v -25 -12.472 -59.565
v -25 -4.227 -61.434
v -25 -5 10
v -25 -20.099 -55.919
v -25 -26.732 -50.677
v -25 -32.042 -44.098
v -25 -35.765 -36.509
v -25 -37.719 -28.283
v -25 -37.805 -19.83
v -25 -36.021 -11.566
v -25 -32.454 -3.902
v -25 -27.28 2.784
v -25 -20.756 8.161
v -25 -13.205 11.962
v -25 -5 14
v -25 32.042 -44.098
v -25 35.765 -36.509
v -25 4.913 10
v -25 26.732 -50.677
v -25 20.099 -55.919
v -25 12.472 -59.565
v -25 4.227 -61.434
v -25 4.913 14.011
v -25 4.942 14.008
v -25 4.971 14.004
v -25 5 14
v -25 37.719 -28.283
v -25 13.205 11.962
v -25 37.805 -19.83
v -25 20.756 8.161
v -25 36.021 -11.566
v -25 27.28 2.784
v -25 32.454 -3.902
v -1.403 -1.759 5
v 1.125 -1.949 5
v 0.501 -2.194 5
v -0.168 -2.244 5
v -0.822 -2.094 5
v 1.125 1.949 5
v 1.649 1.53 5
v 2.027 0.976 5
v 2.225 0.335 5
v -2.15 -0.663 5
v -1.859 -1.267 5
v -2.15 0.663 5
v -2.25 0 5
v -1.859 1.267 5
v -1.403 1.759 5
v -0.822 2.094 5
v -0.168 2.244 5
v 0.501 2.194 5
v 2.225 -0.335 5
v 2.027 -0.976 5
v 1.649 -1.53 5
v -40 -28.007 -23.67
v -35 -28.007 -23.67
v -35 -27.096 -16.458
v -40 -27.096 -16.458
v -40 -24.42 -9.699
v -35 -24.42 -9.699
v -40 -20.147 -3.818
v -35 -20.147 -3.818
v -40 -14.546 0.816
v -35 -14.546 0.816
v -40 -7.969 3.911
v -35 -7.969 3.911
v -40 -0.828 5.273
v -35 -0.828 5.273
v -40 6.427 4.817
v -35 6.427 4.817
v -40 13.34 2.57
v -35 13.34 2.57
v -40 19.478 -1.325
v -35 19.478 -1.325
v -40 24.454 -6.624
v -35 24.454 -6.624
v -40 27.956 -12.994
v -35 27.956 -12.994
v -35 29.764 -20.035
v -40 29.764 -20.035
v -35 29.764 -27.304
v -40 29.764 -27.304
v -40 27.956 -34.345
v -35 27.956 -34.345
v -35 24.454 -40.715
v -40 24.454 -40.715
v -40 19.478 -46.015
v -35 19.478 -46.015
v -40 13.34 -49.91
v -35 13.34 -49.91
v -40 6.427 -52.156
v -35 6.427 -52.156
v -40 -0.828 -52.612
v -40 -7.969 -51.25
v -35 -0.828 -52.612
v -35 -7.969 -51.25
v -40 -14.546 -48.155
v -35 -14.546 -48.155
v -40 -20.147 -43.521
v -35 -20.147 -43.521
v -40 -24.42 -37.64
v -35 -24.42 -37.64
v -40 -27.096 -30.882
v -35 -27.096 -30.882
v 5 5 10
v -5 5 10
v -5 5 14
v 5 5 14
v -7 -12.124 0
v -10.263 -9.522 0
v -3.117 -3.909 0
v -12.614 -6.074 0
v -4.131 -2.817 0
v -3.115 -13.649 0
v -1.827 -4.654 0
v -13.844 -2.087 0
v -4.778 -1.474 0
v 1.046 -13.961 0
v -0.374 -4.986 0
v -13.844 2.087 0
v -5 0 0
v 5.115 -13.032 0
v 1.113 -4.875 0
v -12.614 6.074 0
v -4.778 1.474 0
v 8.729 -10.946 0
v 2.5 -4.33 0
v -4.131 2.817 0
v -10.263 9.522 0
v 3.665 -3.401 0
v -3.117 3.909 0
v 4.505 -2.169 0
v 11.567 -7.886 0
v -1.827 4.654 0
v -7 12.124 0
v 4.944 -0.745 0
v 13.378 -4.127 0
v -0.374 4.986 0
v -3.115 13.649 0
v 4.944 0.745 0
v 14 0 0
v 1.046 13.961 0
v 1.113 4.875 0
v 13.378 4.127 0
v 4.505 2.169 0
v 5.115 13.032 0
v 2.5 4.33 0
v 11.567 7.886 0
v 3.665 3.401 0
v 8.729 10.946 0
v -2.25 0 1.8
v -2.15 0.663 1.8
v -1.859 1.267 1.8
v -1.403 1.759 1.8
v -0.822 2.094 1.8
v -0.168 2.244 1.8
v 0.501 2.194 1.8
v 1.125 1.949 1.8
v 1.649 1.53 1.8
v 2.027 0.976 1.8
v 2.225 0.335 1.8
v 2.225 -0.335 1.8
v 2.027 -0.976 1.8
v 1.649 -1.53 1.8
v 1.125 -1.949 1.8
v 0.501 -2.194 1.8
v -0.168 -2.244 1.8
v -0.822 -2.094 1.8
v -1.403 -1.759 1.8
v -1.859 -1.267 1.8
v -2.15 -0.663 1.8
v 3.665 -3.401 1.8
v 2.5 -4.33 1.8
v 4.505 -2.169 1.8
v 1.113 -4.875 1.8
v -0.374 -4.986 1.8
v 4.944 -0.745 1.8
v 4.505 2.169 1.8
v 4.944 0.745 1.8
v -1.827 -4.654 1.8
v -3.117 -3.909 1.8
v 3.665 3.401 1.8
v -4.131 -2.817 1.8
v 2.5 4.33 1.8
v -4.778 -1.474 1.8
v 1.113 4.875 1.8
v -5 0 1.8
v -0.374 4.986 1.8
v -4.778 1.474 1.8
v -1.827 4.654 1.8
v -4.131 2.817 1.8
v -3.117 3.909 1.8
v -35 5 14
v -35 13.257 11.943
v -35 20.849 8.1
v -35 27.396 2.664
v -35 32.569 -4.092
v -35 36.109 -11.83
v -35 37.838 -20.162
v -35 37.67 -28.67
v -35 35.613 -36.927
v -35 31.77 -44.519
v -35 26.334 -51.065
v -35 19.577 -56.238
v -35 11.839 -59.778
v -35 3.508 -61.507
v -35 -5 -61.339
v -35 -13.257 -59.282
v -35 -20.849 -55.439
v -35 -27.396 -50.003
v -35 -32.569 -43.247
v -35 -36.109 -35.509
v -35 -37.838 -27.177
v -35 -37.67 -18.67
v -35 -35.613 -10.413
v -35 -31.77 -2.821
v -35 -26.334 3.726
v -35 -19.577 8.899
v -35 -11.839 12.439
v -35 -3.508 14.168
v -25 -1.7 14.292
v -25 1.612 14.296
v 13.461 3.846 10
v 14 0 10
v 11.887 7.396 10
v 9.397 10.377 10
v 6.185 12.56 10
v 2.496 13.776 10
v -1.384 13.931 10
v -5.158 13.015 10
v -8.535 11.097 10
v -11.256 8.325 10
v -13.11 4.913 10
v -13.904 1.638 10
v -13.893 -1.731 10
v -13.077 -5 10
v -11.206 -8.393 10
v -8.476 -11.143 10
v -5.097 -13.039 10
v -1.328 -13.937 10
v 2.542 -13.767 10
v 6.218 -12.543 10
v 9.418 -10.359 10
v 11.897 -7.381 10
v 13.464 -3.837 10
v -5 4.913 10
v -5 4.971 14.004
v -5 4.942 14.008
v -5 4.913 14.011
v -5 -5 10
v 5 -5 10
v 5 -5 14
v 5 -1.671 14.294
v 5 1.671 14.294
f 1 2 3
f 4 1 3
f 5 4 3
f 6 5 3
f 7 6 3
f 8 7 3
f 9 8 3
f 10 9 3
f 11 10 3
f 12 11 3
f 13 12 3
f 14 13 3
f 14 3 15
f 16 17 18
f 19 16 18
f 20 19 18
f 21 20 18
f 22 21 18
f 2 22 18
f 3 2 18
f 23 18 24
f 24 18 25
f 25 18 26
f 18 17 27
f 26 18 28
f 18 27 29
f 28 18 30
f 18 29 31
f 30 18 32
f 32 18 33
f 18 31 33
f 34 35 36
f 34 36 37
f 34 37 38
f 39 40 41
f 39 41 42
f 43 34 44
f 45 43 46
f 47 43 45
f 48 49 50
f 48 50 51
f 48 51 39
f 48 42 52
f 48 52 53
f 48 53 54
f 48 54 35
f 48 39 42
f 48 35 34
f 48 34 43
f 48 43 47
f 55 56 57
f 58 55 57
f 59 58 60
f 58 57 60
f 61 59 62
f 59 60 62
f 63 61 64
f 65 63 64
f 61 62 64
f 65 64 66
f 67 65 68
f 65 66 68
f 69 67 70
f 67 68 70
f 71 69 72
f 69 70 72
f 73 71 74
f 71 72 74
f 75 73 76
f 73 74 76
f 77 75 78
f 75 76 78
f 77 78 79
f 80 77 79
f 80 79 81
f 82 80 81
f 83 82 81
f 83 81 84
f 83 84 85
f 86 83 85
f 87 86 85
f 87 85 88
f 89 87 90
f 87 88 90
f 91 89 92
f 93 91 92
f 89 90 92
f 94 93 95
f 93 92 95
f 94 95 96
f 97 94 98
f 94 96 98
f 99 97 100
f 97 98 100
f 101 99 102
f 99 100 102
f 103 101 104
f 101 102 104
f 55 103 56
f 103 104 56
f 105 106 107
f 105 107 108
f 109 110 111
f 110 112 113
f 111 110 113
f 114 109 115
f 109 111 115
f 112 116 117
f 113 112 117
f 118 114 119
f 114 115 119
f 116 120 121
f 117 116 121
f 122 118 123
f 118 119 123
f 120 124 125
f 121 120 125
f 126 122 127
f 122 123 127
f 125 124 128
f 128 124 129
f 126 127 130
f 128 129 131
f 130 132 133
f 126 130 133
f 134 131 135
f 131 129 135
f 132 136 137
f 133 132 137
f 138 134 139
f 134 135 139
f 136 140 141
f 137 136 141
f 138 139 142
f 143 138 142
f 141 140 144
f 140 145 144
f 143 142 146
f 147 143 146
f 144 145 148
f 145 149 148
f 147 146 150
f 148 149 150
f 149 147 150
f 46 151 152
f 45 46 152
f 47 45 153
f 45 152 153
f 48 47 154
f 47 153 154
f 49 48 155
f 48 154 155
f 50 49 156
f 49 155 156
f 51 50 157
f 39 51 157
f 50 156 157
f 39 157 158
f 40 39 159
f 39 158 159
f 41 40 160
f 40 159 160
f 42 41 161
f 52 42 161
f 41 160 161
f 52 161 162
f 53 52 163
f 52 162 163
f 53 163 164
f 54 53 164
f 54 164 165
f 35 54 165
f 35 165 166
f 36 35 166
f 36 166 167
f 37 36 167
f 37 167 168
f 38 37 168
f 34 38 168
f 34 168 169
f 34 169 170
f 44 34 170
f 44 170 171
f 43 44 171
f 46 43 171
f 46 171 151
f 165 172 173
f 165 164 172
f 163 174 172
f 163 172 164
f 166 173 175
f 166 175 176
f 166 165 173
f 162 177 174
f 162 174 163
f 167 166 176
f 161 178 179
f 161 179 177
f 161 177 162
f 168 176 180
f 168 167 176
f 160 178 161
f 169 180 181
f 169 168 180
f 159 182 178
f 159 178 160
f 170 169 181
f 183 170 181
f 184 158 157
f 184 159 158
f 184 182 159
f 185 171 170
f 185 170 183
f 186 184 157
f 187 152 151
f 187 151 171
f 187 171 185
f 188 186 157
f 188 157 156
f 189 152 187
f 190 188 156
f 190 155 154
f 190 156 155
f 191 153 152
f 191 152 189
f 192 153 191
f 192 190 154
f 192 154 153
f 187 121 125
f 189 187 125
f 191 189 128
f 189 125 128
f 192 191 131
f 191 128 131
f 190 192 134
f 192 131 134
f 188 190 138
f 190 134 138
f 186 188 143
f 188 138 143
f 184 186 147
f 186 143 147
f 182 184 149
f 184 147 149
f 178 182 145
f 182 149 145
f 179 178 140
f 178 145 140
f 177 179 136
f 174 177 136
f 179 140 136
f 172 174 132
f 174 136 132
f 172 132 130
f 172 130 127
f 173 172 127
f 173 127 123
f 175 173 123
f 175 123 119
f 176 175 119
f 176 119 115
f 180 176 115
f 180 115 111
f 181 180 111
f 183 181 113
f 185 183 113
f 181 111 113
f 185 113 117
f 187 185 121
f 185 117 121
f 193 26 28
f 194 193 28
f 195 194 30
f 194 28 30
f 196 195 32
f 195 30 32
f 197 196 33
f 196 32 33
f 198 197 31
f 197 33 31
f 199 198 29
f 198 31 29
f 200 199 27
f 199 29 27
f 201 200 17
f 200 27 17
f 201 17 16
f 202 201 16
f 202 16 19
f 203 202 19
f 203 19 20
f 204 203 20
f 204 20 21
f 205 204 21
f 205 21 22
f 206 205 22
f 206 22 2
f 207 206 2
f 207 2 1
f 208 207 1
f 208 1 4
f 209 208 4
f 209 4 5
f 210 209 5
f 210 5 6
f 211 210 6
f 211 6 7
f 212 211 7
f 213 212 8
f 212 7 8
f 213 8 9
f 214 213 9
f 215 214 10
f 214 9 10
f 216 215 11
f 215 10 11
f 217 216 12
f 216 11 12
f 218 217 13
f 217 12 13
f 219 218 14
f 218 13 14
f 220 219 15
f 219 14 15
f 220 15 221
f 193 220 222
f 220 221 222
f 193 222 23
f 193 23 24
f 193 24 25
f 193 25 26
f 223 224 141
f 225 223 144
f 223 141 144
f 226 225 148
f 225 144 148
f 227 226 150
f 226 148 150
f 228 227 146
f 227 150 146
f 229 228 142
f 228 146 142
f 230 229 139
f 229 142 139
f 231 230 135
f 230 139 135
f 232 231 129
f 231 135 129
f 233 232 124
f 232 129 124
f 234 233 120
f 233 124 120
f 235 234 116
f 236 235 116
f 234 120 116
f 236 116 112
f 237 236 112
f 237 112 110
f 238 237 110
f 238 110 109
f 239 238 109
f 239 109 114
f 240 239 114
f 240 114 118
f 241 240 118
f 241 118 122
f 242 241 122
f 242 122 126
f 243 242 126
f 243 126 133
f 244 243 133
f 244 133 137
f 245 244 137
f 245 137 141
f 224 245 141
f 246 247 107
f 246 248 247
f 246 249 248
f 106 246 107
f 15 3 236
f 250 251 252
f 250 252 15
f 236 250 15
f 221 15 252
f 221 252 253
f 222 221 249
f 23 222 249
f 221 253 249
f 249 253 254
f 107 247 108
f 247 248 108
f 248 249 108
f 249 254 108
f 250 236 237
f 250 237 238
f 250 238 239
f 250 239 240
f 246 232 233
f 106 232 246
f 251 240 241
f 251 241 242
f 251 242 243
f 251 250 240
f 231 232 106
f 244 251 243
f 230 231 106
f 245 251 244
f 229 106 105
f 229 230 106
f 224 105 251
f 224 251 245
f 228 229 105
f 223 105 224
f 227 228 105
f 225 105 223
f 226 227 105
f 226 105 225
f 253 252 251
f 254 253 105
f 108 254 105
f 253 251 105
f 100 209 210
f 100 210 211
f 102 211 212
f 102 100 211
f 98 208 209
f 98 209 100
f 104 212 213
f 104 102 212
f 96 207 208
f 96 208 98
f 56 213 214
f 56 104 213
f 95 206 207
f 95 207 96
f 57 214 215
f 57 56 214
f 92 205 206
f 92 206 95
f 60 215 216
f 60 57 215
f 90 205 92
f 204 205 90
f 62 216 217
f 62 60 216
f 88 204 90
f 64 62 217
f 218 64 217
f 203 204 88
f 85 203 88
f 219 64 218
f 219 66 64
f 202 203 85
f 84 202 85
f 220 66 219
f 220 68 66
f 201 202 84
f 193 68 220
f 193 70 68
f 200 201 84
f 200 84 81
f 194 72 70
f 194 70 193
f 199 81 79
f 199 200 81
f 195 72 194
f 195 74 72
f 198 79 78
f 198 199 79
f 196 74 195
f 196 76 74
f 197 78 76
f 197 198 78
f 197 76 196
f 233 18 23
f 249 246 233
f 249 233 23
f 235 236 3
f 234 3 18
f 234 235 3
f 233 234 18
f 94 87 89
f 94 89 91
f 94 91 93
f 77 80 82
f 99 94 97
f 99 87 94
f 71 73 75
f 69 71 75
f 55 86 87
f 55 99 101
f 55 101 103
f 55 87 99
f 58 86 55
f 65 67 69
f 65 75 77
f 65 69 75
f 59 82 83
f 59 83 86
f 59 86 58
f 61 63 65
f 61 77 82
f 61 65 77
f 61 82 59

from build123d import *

# Parameters (mm, degrees)
SKETCH1_R           = 14
BOSS_EXTRUDE1_DEPTH = 10
SKETCH2_R           = 2.25
CUT_EXTRUDE1_DEPTH  = 5
SKETCH3_R           = 5
CUT_EXTRUDE2_DEPTH  = 1.8
SKETCH4_W           = 10
SKETCH4_H           = 10
BOSS_EXTRUDE2_DEPTH = 8
SKETCH6_W           = 8
SKETCH6_H           = 9.912865289
BOSS_EXTRUDE3_DEPTH = 20
CUT_EXTRUDE3_DEPTH  = 30
SKETCH8_R           = 38
BOSS_EXTRUDE4_DEPTH = 10
SKETCH9_R           = 29
BOSS_EXTRUDE5_DEPTH = 5


with BuildPart() as part:
    # Sketch1 → Boss-Extrude1 (new body)
    with BuildSketch(Plane.XY):
        Circle(SKETCH1_R)
    extrude(amount=BOSS_EXTRUDE1_DEPTH)

    # Sketch2 → Cut-Extrude1 (cut)
    with BuildSketch(Plane(origin=(0, 0, 0), x_dir=(-1, 0, 0), z_dir=(0, 0, -1))):
        Circle(SKETCH2_R)
    extrude(amount=-CUT_EXTRUDE1_DEPTH, mode=Mode.SUBTRACT)

    # Sketch3 → Cut-Extrude2 (cut)
    with BuildSketch(Plane(origin=(0, 0, 0), x_dir=(-1, 0, 0), z_dir=(0, 0, -1))):
        Circle(SKETCH3_R)
    extrude(amount=-CUT_EXTRUDE2_DEPTH, mode=Mode.SUBTRACT)

    # Sketch4 → Boss-Extrude2 (add)
    with BuildSketch(Plane.XY.offset(10)):
        Rectangle(SKETCH4_W, SKETCH4_H)
    extrude(amount=BOSS_EXTRUDE2_DEPTH)

    # Sketch6 → Boss-Extrude3 (add)
    with BuildSketch(Plane.ZY.offset(5)):
        with Locations((14, -0.043567356)):
            Rectangle(SKETCH6_W, SKETCH6_H)
    extrude(amount=BOSS_EXTRUDE3_DEPTH)

    # Sketch7 → Cut-Extrude3 (cut)
    with BuildSketch(Plane(origin=(5, 0, 0), x_dir=(0, 0, -1), z_dir=(1, 0, 0))):
        with BuildLine():
            Line((-18, 5), (-18, -5))
            Line((-18, -5), (-14, -5))
            ThreePointArc((-14, -5), (-14.330383596, 0), (-14, 5))
            Line((-14, 5), (-18, 5))
        make_face()
    extrude(amount=-CUT_EXTRUDE3_DEPTH, mode=Mode.SUBTRACT)

    # Sketch8 → Boss-Extrude4 (add)
    with BuildSketch(Plane.ZY.offset(25)):
        with Locations(Location((-23.669616404, 0, 0), (0, 0, 7.560843177))):
            Circle(SKETCH8_R)
    extrude(amount=BOSS_EXTRUDE4_DEPTH)

    # Sketch9 → Boss-Extrude5 (add)
    with BuildSketch(Plane.ZY.offset(35)):
        with Locations(Location((-23.669616404, 0.99287457, 0), (0, 0, 270))):
            Circle(SKETCH9_R)
    extrude(amount=BOSS_EXTRUDE5_DEPTH)


solid = part.part
